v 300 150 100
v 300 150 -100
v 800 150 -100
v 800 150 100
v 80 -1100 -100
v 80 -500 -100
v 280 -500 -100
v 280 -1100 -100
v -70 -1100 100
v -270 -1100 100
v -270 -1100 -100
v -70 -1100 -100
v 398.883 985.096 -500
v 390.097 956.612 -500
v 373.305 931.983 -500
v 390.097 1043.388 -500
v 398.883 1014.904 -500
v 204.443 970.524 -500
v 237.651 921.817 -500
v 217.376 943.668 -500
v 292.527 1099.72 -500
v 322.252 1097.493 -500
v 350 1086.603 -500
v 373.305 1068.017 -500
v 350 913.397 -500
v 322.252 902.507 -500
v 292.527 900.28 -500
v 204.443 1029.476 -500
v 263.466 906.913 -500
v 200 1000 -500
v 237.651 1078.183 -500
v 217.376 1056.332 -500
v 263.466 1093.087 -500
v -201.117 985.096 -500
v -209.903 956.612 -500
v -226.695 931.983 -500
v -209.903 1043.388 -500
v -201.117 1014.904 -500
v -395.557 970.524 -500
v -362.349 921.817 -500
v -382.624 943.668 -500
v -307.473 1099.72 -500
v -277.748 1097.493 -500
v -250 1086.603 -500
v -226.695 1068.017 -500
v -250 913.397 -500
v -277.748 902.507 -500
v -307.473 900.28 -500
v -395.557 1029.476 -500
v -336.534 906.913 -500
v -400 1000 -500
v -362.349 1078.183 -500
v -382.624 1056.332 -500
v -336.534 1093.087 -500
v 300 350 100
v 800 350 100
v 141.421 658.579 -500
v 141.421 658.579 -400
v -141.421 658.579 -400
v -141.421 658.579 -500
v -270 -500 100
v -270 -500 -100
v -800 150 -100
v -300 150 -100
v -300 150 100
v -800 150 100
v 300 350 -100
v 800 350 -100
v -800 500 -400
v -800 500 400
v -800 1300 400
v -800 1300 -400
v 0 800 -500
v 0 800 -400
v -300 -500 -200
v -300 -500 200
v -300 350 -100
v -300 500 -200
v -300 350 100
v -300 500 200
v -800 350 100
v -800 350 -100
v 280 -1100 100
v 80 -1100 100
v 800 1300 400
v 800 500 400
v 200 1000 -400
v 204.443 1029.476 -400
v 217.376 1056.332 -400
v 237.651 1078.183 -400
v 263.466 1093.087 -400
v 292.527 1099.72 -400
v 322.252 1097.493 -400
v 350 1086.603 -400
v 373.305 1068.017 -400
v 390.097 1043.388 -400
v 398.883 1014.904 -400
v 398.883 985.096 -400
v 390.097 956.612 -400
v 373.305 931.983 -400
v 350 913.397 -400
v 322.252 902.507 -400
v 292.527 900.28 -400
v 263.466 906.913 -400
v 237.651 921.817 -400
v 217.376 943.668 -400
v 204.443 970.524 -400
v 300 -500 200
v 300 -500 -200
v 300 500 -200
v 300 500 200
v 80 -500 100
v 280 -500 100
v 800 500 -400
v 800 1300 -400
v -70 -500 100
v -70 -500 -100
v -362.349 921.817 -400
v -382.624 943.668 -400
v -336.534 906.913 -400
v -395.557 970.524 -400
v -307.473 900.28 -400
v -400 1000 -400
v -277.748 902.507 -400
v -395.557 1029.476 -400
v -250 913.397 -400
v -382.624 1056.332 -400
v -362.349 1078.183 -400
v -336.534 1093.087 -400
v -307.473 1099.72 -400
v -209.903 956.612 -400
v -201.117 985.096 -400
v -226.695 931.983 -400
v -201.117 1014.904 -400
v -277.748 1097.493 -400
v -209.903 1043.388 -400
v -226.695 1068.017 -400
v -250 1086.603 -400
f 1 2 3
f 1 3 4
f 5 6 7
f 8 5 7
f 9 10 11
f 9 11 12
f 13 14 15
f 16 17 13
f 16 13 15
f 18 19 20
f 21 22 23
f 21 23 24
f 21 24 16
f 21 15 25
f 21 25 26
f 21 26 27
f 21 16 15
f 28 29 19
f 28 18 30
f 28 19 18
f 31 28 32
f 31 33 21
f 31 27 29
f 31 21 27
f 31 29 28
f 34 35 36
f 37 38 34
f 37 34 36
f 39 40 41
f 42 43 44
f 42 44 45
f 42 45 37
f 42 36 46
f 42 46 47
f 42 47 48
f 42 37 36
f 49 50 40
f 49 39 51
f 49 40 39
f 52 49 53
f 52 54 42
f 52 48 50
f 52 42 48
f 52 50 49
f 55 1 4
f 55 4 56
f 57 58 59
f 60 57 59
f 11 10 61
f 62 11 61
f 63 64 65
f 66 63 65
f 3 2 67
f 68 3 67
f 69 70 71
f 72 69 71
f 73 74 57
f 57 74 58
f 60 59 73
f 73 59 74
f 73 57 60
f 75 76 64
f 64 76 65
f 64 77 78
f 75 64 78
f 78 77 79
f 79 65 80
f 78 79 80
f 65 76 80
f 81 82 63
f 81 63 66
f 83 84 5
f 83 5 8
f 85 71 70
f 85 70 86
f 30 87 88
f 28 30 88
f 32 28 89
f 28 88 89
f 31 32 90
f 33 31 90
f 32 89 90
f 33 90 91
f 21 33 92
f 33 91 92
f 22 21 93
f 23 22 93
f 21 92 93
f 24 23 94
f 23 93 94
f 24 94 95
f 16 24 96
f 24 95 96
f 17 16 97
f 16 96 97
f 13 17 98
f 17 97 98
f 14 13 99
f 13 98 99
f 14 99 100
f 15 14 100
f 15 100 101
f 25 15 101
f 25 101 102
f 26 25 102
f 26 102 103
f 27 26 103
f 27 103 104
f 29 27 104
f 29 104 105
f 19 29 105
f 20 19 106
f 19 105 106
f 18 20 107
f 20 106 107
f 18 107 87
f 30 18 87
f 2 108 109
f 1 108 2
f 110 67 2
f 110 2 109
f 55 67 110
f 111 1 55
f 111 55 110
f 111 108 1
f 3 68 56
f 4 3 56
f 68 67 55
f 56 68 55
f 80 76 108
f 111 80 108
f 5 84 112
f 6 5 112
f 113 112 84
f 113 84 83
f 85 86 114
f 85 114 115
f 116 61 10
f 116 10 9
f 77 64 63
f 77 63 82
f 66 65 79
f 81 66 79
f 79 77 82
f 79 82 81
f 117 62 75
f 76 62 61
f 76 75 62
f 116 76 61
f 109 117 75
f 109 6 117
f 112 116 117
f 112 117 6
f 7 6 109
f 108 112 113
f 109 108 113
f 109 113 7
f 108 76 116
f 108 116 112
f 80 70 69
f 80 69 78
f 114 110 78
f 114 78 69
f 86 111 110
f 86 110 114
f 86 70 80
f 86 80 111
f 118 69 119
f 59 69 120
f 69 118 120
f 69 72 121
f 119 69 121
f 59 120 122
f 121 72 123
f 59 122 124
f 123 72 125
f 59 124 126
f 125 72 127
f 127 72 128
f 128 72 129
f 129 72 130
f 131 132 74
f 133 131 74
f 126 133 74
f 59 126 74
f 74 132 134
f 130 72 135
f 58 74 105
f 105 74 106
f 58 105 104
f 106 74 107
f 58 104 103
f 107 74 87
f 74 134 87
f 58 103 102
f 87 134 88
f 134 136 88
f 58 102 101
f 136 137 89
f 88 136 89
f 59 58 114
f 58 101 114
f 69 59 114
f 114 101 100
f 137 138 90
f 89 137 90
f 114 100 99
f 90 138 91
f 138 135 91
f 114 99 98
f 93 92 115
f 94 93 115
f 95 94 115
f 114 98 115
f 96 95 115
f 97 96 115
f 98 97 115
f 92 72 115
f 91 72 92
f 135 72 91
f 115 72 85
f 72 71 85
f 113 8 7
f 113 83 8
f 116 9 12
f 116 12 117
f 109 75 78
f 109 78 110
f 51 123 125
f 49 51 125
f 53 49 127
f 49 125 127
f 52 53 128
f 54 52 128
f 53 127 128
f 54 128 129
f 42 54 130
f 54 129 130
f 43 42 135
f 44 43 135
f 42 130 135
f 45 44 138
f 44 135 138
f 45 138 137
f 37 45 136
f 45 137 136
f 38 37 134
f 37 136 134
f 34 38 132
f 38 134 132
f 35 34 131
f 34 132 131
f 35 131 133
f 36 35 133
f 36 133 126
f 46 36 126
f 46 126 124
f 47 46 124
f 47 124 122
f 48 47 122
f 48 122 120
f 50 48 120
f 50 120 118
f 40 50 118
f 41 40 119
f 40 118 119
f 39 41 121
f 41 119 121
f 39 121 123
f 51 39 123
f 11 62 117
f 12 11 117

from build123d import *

# Parameters (mm, degrees)
BOSS_EXTRUDE1_DEPTH      = 400
BOSS_EXTRUDE1_DEPTH_BACK = 400
SKETCH1_W                = 1600
SKETCH1_H                = 800
BOSS_EXTRUDE2_DEPTH      = 200
BOSS_EXTRUDE2_DEPTH_BACK = 200
SKETCH2_W                = 600
SKETCH2_H                = 1000
BOSS_EXTRUDE3_DEPTH      = 100
BOSS_EXTRUDE3_DEPTH_BACK = 100
SKETCH3_W                = 200
SKETCH3_H                = 600
SKETCH4_W                = 200
SKETCH4_H                = 200
BOSS_EXTRUDE4_DEPTH      = 500
SKETCH5_R                = 100
BOSS_EXTRUDE5_DEPTH      = 100


with BuildPart() as part:
    # Sketch1 → Boss-Extrude1 (new, two sides: drawn at the far end of the back side and taken through both)
    with BuildSketch(Plane.XY.offset(-BOSS_EXTRUDE1_DEPTH_BACK)):
        with Locations((0, 900)):
            Rectangle(SKETCH1_W, SKETCH1_H)
    extrude(amount=BOSS_EXTRUDE1_DEPTH + BOSS_EXTRUDE1_DEPTH_BACK)

    # Sketch2 → Boss-Extrude2 (add, two sides: drawn at the far end of the back side and taken through both)
    with BuildSketch(Plane.XY.offset(-BOSS_EXTRUDE2_DEPTH_BACK)):
        Rectangle(SKETCH2_W, SKETCH2_H)
    extrude(amount=BOSS_EXTRUDE2_DEPTH + BOSS_EXTRUDE2_DEPTH_BACK)

    # Sketch3 → Boss-Extrude3 (add, two sides: drawn at the far end of the back side and taken through both)
    with BuildSketch(Plane.XY.offset(-BOSS_EXTRUDE3_DEPTH_BACK)):
        with Locations((-170, -800)):
            Rectangle(SKETCH3_W, SKETCH3_H)
        with Locations((180, -800)):
            Rectangle(SKETCH3_W, SKETCH3_H)
    extrude(amount=BOSS_EXTRUDE3_DEPTH + BOSS_EXTRUDE3_DEPTH_BACK)

    # Sketch4 → Boss-Extrude4 (add)
    with BuildSketch(Plane.ZY.offset(300)):
        with Locations((0, 250)):
            Rectangle(SKETCH4_W, SKETCH4_H)
    boss_extrude4 = extrude(amount=BOSS_EXTRUDE4_DEPTH)

    # Mirror1: Boss-Extrude4 across plane
    add(boss_extrude4.mirror(Plane(origin=(0, 0, 0), x_dir=(0, 0, 1), z_dir=(1, 0, 0))))

    # Sketch5 → Boss-Extrude5 (add)
    with BuildSketch(Plane(origin=(0, 0, -400), x_dir=(-1, 0, 0), z_dir=(0, 0, -1))):
        with Locations((-300, 1000)):
            Circle(SKETCH5_R)
        with Locations((300, 1000)):
            Circle(SKETCH5_R)
        Polygon((0, 800), (-141.421356237, 658.578643763), (141.421356237, 658.578643763), align=None)
    extrude(amount=BOSS_EXTRUDE5_DEPTH)


solid = part.part
